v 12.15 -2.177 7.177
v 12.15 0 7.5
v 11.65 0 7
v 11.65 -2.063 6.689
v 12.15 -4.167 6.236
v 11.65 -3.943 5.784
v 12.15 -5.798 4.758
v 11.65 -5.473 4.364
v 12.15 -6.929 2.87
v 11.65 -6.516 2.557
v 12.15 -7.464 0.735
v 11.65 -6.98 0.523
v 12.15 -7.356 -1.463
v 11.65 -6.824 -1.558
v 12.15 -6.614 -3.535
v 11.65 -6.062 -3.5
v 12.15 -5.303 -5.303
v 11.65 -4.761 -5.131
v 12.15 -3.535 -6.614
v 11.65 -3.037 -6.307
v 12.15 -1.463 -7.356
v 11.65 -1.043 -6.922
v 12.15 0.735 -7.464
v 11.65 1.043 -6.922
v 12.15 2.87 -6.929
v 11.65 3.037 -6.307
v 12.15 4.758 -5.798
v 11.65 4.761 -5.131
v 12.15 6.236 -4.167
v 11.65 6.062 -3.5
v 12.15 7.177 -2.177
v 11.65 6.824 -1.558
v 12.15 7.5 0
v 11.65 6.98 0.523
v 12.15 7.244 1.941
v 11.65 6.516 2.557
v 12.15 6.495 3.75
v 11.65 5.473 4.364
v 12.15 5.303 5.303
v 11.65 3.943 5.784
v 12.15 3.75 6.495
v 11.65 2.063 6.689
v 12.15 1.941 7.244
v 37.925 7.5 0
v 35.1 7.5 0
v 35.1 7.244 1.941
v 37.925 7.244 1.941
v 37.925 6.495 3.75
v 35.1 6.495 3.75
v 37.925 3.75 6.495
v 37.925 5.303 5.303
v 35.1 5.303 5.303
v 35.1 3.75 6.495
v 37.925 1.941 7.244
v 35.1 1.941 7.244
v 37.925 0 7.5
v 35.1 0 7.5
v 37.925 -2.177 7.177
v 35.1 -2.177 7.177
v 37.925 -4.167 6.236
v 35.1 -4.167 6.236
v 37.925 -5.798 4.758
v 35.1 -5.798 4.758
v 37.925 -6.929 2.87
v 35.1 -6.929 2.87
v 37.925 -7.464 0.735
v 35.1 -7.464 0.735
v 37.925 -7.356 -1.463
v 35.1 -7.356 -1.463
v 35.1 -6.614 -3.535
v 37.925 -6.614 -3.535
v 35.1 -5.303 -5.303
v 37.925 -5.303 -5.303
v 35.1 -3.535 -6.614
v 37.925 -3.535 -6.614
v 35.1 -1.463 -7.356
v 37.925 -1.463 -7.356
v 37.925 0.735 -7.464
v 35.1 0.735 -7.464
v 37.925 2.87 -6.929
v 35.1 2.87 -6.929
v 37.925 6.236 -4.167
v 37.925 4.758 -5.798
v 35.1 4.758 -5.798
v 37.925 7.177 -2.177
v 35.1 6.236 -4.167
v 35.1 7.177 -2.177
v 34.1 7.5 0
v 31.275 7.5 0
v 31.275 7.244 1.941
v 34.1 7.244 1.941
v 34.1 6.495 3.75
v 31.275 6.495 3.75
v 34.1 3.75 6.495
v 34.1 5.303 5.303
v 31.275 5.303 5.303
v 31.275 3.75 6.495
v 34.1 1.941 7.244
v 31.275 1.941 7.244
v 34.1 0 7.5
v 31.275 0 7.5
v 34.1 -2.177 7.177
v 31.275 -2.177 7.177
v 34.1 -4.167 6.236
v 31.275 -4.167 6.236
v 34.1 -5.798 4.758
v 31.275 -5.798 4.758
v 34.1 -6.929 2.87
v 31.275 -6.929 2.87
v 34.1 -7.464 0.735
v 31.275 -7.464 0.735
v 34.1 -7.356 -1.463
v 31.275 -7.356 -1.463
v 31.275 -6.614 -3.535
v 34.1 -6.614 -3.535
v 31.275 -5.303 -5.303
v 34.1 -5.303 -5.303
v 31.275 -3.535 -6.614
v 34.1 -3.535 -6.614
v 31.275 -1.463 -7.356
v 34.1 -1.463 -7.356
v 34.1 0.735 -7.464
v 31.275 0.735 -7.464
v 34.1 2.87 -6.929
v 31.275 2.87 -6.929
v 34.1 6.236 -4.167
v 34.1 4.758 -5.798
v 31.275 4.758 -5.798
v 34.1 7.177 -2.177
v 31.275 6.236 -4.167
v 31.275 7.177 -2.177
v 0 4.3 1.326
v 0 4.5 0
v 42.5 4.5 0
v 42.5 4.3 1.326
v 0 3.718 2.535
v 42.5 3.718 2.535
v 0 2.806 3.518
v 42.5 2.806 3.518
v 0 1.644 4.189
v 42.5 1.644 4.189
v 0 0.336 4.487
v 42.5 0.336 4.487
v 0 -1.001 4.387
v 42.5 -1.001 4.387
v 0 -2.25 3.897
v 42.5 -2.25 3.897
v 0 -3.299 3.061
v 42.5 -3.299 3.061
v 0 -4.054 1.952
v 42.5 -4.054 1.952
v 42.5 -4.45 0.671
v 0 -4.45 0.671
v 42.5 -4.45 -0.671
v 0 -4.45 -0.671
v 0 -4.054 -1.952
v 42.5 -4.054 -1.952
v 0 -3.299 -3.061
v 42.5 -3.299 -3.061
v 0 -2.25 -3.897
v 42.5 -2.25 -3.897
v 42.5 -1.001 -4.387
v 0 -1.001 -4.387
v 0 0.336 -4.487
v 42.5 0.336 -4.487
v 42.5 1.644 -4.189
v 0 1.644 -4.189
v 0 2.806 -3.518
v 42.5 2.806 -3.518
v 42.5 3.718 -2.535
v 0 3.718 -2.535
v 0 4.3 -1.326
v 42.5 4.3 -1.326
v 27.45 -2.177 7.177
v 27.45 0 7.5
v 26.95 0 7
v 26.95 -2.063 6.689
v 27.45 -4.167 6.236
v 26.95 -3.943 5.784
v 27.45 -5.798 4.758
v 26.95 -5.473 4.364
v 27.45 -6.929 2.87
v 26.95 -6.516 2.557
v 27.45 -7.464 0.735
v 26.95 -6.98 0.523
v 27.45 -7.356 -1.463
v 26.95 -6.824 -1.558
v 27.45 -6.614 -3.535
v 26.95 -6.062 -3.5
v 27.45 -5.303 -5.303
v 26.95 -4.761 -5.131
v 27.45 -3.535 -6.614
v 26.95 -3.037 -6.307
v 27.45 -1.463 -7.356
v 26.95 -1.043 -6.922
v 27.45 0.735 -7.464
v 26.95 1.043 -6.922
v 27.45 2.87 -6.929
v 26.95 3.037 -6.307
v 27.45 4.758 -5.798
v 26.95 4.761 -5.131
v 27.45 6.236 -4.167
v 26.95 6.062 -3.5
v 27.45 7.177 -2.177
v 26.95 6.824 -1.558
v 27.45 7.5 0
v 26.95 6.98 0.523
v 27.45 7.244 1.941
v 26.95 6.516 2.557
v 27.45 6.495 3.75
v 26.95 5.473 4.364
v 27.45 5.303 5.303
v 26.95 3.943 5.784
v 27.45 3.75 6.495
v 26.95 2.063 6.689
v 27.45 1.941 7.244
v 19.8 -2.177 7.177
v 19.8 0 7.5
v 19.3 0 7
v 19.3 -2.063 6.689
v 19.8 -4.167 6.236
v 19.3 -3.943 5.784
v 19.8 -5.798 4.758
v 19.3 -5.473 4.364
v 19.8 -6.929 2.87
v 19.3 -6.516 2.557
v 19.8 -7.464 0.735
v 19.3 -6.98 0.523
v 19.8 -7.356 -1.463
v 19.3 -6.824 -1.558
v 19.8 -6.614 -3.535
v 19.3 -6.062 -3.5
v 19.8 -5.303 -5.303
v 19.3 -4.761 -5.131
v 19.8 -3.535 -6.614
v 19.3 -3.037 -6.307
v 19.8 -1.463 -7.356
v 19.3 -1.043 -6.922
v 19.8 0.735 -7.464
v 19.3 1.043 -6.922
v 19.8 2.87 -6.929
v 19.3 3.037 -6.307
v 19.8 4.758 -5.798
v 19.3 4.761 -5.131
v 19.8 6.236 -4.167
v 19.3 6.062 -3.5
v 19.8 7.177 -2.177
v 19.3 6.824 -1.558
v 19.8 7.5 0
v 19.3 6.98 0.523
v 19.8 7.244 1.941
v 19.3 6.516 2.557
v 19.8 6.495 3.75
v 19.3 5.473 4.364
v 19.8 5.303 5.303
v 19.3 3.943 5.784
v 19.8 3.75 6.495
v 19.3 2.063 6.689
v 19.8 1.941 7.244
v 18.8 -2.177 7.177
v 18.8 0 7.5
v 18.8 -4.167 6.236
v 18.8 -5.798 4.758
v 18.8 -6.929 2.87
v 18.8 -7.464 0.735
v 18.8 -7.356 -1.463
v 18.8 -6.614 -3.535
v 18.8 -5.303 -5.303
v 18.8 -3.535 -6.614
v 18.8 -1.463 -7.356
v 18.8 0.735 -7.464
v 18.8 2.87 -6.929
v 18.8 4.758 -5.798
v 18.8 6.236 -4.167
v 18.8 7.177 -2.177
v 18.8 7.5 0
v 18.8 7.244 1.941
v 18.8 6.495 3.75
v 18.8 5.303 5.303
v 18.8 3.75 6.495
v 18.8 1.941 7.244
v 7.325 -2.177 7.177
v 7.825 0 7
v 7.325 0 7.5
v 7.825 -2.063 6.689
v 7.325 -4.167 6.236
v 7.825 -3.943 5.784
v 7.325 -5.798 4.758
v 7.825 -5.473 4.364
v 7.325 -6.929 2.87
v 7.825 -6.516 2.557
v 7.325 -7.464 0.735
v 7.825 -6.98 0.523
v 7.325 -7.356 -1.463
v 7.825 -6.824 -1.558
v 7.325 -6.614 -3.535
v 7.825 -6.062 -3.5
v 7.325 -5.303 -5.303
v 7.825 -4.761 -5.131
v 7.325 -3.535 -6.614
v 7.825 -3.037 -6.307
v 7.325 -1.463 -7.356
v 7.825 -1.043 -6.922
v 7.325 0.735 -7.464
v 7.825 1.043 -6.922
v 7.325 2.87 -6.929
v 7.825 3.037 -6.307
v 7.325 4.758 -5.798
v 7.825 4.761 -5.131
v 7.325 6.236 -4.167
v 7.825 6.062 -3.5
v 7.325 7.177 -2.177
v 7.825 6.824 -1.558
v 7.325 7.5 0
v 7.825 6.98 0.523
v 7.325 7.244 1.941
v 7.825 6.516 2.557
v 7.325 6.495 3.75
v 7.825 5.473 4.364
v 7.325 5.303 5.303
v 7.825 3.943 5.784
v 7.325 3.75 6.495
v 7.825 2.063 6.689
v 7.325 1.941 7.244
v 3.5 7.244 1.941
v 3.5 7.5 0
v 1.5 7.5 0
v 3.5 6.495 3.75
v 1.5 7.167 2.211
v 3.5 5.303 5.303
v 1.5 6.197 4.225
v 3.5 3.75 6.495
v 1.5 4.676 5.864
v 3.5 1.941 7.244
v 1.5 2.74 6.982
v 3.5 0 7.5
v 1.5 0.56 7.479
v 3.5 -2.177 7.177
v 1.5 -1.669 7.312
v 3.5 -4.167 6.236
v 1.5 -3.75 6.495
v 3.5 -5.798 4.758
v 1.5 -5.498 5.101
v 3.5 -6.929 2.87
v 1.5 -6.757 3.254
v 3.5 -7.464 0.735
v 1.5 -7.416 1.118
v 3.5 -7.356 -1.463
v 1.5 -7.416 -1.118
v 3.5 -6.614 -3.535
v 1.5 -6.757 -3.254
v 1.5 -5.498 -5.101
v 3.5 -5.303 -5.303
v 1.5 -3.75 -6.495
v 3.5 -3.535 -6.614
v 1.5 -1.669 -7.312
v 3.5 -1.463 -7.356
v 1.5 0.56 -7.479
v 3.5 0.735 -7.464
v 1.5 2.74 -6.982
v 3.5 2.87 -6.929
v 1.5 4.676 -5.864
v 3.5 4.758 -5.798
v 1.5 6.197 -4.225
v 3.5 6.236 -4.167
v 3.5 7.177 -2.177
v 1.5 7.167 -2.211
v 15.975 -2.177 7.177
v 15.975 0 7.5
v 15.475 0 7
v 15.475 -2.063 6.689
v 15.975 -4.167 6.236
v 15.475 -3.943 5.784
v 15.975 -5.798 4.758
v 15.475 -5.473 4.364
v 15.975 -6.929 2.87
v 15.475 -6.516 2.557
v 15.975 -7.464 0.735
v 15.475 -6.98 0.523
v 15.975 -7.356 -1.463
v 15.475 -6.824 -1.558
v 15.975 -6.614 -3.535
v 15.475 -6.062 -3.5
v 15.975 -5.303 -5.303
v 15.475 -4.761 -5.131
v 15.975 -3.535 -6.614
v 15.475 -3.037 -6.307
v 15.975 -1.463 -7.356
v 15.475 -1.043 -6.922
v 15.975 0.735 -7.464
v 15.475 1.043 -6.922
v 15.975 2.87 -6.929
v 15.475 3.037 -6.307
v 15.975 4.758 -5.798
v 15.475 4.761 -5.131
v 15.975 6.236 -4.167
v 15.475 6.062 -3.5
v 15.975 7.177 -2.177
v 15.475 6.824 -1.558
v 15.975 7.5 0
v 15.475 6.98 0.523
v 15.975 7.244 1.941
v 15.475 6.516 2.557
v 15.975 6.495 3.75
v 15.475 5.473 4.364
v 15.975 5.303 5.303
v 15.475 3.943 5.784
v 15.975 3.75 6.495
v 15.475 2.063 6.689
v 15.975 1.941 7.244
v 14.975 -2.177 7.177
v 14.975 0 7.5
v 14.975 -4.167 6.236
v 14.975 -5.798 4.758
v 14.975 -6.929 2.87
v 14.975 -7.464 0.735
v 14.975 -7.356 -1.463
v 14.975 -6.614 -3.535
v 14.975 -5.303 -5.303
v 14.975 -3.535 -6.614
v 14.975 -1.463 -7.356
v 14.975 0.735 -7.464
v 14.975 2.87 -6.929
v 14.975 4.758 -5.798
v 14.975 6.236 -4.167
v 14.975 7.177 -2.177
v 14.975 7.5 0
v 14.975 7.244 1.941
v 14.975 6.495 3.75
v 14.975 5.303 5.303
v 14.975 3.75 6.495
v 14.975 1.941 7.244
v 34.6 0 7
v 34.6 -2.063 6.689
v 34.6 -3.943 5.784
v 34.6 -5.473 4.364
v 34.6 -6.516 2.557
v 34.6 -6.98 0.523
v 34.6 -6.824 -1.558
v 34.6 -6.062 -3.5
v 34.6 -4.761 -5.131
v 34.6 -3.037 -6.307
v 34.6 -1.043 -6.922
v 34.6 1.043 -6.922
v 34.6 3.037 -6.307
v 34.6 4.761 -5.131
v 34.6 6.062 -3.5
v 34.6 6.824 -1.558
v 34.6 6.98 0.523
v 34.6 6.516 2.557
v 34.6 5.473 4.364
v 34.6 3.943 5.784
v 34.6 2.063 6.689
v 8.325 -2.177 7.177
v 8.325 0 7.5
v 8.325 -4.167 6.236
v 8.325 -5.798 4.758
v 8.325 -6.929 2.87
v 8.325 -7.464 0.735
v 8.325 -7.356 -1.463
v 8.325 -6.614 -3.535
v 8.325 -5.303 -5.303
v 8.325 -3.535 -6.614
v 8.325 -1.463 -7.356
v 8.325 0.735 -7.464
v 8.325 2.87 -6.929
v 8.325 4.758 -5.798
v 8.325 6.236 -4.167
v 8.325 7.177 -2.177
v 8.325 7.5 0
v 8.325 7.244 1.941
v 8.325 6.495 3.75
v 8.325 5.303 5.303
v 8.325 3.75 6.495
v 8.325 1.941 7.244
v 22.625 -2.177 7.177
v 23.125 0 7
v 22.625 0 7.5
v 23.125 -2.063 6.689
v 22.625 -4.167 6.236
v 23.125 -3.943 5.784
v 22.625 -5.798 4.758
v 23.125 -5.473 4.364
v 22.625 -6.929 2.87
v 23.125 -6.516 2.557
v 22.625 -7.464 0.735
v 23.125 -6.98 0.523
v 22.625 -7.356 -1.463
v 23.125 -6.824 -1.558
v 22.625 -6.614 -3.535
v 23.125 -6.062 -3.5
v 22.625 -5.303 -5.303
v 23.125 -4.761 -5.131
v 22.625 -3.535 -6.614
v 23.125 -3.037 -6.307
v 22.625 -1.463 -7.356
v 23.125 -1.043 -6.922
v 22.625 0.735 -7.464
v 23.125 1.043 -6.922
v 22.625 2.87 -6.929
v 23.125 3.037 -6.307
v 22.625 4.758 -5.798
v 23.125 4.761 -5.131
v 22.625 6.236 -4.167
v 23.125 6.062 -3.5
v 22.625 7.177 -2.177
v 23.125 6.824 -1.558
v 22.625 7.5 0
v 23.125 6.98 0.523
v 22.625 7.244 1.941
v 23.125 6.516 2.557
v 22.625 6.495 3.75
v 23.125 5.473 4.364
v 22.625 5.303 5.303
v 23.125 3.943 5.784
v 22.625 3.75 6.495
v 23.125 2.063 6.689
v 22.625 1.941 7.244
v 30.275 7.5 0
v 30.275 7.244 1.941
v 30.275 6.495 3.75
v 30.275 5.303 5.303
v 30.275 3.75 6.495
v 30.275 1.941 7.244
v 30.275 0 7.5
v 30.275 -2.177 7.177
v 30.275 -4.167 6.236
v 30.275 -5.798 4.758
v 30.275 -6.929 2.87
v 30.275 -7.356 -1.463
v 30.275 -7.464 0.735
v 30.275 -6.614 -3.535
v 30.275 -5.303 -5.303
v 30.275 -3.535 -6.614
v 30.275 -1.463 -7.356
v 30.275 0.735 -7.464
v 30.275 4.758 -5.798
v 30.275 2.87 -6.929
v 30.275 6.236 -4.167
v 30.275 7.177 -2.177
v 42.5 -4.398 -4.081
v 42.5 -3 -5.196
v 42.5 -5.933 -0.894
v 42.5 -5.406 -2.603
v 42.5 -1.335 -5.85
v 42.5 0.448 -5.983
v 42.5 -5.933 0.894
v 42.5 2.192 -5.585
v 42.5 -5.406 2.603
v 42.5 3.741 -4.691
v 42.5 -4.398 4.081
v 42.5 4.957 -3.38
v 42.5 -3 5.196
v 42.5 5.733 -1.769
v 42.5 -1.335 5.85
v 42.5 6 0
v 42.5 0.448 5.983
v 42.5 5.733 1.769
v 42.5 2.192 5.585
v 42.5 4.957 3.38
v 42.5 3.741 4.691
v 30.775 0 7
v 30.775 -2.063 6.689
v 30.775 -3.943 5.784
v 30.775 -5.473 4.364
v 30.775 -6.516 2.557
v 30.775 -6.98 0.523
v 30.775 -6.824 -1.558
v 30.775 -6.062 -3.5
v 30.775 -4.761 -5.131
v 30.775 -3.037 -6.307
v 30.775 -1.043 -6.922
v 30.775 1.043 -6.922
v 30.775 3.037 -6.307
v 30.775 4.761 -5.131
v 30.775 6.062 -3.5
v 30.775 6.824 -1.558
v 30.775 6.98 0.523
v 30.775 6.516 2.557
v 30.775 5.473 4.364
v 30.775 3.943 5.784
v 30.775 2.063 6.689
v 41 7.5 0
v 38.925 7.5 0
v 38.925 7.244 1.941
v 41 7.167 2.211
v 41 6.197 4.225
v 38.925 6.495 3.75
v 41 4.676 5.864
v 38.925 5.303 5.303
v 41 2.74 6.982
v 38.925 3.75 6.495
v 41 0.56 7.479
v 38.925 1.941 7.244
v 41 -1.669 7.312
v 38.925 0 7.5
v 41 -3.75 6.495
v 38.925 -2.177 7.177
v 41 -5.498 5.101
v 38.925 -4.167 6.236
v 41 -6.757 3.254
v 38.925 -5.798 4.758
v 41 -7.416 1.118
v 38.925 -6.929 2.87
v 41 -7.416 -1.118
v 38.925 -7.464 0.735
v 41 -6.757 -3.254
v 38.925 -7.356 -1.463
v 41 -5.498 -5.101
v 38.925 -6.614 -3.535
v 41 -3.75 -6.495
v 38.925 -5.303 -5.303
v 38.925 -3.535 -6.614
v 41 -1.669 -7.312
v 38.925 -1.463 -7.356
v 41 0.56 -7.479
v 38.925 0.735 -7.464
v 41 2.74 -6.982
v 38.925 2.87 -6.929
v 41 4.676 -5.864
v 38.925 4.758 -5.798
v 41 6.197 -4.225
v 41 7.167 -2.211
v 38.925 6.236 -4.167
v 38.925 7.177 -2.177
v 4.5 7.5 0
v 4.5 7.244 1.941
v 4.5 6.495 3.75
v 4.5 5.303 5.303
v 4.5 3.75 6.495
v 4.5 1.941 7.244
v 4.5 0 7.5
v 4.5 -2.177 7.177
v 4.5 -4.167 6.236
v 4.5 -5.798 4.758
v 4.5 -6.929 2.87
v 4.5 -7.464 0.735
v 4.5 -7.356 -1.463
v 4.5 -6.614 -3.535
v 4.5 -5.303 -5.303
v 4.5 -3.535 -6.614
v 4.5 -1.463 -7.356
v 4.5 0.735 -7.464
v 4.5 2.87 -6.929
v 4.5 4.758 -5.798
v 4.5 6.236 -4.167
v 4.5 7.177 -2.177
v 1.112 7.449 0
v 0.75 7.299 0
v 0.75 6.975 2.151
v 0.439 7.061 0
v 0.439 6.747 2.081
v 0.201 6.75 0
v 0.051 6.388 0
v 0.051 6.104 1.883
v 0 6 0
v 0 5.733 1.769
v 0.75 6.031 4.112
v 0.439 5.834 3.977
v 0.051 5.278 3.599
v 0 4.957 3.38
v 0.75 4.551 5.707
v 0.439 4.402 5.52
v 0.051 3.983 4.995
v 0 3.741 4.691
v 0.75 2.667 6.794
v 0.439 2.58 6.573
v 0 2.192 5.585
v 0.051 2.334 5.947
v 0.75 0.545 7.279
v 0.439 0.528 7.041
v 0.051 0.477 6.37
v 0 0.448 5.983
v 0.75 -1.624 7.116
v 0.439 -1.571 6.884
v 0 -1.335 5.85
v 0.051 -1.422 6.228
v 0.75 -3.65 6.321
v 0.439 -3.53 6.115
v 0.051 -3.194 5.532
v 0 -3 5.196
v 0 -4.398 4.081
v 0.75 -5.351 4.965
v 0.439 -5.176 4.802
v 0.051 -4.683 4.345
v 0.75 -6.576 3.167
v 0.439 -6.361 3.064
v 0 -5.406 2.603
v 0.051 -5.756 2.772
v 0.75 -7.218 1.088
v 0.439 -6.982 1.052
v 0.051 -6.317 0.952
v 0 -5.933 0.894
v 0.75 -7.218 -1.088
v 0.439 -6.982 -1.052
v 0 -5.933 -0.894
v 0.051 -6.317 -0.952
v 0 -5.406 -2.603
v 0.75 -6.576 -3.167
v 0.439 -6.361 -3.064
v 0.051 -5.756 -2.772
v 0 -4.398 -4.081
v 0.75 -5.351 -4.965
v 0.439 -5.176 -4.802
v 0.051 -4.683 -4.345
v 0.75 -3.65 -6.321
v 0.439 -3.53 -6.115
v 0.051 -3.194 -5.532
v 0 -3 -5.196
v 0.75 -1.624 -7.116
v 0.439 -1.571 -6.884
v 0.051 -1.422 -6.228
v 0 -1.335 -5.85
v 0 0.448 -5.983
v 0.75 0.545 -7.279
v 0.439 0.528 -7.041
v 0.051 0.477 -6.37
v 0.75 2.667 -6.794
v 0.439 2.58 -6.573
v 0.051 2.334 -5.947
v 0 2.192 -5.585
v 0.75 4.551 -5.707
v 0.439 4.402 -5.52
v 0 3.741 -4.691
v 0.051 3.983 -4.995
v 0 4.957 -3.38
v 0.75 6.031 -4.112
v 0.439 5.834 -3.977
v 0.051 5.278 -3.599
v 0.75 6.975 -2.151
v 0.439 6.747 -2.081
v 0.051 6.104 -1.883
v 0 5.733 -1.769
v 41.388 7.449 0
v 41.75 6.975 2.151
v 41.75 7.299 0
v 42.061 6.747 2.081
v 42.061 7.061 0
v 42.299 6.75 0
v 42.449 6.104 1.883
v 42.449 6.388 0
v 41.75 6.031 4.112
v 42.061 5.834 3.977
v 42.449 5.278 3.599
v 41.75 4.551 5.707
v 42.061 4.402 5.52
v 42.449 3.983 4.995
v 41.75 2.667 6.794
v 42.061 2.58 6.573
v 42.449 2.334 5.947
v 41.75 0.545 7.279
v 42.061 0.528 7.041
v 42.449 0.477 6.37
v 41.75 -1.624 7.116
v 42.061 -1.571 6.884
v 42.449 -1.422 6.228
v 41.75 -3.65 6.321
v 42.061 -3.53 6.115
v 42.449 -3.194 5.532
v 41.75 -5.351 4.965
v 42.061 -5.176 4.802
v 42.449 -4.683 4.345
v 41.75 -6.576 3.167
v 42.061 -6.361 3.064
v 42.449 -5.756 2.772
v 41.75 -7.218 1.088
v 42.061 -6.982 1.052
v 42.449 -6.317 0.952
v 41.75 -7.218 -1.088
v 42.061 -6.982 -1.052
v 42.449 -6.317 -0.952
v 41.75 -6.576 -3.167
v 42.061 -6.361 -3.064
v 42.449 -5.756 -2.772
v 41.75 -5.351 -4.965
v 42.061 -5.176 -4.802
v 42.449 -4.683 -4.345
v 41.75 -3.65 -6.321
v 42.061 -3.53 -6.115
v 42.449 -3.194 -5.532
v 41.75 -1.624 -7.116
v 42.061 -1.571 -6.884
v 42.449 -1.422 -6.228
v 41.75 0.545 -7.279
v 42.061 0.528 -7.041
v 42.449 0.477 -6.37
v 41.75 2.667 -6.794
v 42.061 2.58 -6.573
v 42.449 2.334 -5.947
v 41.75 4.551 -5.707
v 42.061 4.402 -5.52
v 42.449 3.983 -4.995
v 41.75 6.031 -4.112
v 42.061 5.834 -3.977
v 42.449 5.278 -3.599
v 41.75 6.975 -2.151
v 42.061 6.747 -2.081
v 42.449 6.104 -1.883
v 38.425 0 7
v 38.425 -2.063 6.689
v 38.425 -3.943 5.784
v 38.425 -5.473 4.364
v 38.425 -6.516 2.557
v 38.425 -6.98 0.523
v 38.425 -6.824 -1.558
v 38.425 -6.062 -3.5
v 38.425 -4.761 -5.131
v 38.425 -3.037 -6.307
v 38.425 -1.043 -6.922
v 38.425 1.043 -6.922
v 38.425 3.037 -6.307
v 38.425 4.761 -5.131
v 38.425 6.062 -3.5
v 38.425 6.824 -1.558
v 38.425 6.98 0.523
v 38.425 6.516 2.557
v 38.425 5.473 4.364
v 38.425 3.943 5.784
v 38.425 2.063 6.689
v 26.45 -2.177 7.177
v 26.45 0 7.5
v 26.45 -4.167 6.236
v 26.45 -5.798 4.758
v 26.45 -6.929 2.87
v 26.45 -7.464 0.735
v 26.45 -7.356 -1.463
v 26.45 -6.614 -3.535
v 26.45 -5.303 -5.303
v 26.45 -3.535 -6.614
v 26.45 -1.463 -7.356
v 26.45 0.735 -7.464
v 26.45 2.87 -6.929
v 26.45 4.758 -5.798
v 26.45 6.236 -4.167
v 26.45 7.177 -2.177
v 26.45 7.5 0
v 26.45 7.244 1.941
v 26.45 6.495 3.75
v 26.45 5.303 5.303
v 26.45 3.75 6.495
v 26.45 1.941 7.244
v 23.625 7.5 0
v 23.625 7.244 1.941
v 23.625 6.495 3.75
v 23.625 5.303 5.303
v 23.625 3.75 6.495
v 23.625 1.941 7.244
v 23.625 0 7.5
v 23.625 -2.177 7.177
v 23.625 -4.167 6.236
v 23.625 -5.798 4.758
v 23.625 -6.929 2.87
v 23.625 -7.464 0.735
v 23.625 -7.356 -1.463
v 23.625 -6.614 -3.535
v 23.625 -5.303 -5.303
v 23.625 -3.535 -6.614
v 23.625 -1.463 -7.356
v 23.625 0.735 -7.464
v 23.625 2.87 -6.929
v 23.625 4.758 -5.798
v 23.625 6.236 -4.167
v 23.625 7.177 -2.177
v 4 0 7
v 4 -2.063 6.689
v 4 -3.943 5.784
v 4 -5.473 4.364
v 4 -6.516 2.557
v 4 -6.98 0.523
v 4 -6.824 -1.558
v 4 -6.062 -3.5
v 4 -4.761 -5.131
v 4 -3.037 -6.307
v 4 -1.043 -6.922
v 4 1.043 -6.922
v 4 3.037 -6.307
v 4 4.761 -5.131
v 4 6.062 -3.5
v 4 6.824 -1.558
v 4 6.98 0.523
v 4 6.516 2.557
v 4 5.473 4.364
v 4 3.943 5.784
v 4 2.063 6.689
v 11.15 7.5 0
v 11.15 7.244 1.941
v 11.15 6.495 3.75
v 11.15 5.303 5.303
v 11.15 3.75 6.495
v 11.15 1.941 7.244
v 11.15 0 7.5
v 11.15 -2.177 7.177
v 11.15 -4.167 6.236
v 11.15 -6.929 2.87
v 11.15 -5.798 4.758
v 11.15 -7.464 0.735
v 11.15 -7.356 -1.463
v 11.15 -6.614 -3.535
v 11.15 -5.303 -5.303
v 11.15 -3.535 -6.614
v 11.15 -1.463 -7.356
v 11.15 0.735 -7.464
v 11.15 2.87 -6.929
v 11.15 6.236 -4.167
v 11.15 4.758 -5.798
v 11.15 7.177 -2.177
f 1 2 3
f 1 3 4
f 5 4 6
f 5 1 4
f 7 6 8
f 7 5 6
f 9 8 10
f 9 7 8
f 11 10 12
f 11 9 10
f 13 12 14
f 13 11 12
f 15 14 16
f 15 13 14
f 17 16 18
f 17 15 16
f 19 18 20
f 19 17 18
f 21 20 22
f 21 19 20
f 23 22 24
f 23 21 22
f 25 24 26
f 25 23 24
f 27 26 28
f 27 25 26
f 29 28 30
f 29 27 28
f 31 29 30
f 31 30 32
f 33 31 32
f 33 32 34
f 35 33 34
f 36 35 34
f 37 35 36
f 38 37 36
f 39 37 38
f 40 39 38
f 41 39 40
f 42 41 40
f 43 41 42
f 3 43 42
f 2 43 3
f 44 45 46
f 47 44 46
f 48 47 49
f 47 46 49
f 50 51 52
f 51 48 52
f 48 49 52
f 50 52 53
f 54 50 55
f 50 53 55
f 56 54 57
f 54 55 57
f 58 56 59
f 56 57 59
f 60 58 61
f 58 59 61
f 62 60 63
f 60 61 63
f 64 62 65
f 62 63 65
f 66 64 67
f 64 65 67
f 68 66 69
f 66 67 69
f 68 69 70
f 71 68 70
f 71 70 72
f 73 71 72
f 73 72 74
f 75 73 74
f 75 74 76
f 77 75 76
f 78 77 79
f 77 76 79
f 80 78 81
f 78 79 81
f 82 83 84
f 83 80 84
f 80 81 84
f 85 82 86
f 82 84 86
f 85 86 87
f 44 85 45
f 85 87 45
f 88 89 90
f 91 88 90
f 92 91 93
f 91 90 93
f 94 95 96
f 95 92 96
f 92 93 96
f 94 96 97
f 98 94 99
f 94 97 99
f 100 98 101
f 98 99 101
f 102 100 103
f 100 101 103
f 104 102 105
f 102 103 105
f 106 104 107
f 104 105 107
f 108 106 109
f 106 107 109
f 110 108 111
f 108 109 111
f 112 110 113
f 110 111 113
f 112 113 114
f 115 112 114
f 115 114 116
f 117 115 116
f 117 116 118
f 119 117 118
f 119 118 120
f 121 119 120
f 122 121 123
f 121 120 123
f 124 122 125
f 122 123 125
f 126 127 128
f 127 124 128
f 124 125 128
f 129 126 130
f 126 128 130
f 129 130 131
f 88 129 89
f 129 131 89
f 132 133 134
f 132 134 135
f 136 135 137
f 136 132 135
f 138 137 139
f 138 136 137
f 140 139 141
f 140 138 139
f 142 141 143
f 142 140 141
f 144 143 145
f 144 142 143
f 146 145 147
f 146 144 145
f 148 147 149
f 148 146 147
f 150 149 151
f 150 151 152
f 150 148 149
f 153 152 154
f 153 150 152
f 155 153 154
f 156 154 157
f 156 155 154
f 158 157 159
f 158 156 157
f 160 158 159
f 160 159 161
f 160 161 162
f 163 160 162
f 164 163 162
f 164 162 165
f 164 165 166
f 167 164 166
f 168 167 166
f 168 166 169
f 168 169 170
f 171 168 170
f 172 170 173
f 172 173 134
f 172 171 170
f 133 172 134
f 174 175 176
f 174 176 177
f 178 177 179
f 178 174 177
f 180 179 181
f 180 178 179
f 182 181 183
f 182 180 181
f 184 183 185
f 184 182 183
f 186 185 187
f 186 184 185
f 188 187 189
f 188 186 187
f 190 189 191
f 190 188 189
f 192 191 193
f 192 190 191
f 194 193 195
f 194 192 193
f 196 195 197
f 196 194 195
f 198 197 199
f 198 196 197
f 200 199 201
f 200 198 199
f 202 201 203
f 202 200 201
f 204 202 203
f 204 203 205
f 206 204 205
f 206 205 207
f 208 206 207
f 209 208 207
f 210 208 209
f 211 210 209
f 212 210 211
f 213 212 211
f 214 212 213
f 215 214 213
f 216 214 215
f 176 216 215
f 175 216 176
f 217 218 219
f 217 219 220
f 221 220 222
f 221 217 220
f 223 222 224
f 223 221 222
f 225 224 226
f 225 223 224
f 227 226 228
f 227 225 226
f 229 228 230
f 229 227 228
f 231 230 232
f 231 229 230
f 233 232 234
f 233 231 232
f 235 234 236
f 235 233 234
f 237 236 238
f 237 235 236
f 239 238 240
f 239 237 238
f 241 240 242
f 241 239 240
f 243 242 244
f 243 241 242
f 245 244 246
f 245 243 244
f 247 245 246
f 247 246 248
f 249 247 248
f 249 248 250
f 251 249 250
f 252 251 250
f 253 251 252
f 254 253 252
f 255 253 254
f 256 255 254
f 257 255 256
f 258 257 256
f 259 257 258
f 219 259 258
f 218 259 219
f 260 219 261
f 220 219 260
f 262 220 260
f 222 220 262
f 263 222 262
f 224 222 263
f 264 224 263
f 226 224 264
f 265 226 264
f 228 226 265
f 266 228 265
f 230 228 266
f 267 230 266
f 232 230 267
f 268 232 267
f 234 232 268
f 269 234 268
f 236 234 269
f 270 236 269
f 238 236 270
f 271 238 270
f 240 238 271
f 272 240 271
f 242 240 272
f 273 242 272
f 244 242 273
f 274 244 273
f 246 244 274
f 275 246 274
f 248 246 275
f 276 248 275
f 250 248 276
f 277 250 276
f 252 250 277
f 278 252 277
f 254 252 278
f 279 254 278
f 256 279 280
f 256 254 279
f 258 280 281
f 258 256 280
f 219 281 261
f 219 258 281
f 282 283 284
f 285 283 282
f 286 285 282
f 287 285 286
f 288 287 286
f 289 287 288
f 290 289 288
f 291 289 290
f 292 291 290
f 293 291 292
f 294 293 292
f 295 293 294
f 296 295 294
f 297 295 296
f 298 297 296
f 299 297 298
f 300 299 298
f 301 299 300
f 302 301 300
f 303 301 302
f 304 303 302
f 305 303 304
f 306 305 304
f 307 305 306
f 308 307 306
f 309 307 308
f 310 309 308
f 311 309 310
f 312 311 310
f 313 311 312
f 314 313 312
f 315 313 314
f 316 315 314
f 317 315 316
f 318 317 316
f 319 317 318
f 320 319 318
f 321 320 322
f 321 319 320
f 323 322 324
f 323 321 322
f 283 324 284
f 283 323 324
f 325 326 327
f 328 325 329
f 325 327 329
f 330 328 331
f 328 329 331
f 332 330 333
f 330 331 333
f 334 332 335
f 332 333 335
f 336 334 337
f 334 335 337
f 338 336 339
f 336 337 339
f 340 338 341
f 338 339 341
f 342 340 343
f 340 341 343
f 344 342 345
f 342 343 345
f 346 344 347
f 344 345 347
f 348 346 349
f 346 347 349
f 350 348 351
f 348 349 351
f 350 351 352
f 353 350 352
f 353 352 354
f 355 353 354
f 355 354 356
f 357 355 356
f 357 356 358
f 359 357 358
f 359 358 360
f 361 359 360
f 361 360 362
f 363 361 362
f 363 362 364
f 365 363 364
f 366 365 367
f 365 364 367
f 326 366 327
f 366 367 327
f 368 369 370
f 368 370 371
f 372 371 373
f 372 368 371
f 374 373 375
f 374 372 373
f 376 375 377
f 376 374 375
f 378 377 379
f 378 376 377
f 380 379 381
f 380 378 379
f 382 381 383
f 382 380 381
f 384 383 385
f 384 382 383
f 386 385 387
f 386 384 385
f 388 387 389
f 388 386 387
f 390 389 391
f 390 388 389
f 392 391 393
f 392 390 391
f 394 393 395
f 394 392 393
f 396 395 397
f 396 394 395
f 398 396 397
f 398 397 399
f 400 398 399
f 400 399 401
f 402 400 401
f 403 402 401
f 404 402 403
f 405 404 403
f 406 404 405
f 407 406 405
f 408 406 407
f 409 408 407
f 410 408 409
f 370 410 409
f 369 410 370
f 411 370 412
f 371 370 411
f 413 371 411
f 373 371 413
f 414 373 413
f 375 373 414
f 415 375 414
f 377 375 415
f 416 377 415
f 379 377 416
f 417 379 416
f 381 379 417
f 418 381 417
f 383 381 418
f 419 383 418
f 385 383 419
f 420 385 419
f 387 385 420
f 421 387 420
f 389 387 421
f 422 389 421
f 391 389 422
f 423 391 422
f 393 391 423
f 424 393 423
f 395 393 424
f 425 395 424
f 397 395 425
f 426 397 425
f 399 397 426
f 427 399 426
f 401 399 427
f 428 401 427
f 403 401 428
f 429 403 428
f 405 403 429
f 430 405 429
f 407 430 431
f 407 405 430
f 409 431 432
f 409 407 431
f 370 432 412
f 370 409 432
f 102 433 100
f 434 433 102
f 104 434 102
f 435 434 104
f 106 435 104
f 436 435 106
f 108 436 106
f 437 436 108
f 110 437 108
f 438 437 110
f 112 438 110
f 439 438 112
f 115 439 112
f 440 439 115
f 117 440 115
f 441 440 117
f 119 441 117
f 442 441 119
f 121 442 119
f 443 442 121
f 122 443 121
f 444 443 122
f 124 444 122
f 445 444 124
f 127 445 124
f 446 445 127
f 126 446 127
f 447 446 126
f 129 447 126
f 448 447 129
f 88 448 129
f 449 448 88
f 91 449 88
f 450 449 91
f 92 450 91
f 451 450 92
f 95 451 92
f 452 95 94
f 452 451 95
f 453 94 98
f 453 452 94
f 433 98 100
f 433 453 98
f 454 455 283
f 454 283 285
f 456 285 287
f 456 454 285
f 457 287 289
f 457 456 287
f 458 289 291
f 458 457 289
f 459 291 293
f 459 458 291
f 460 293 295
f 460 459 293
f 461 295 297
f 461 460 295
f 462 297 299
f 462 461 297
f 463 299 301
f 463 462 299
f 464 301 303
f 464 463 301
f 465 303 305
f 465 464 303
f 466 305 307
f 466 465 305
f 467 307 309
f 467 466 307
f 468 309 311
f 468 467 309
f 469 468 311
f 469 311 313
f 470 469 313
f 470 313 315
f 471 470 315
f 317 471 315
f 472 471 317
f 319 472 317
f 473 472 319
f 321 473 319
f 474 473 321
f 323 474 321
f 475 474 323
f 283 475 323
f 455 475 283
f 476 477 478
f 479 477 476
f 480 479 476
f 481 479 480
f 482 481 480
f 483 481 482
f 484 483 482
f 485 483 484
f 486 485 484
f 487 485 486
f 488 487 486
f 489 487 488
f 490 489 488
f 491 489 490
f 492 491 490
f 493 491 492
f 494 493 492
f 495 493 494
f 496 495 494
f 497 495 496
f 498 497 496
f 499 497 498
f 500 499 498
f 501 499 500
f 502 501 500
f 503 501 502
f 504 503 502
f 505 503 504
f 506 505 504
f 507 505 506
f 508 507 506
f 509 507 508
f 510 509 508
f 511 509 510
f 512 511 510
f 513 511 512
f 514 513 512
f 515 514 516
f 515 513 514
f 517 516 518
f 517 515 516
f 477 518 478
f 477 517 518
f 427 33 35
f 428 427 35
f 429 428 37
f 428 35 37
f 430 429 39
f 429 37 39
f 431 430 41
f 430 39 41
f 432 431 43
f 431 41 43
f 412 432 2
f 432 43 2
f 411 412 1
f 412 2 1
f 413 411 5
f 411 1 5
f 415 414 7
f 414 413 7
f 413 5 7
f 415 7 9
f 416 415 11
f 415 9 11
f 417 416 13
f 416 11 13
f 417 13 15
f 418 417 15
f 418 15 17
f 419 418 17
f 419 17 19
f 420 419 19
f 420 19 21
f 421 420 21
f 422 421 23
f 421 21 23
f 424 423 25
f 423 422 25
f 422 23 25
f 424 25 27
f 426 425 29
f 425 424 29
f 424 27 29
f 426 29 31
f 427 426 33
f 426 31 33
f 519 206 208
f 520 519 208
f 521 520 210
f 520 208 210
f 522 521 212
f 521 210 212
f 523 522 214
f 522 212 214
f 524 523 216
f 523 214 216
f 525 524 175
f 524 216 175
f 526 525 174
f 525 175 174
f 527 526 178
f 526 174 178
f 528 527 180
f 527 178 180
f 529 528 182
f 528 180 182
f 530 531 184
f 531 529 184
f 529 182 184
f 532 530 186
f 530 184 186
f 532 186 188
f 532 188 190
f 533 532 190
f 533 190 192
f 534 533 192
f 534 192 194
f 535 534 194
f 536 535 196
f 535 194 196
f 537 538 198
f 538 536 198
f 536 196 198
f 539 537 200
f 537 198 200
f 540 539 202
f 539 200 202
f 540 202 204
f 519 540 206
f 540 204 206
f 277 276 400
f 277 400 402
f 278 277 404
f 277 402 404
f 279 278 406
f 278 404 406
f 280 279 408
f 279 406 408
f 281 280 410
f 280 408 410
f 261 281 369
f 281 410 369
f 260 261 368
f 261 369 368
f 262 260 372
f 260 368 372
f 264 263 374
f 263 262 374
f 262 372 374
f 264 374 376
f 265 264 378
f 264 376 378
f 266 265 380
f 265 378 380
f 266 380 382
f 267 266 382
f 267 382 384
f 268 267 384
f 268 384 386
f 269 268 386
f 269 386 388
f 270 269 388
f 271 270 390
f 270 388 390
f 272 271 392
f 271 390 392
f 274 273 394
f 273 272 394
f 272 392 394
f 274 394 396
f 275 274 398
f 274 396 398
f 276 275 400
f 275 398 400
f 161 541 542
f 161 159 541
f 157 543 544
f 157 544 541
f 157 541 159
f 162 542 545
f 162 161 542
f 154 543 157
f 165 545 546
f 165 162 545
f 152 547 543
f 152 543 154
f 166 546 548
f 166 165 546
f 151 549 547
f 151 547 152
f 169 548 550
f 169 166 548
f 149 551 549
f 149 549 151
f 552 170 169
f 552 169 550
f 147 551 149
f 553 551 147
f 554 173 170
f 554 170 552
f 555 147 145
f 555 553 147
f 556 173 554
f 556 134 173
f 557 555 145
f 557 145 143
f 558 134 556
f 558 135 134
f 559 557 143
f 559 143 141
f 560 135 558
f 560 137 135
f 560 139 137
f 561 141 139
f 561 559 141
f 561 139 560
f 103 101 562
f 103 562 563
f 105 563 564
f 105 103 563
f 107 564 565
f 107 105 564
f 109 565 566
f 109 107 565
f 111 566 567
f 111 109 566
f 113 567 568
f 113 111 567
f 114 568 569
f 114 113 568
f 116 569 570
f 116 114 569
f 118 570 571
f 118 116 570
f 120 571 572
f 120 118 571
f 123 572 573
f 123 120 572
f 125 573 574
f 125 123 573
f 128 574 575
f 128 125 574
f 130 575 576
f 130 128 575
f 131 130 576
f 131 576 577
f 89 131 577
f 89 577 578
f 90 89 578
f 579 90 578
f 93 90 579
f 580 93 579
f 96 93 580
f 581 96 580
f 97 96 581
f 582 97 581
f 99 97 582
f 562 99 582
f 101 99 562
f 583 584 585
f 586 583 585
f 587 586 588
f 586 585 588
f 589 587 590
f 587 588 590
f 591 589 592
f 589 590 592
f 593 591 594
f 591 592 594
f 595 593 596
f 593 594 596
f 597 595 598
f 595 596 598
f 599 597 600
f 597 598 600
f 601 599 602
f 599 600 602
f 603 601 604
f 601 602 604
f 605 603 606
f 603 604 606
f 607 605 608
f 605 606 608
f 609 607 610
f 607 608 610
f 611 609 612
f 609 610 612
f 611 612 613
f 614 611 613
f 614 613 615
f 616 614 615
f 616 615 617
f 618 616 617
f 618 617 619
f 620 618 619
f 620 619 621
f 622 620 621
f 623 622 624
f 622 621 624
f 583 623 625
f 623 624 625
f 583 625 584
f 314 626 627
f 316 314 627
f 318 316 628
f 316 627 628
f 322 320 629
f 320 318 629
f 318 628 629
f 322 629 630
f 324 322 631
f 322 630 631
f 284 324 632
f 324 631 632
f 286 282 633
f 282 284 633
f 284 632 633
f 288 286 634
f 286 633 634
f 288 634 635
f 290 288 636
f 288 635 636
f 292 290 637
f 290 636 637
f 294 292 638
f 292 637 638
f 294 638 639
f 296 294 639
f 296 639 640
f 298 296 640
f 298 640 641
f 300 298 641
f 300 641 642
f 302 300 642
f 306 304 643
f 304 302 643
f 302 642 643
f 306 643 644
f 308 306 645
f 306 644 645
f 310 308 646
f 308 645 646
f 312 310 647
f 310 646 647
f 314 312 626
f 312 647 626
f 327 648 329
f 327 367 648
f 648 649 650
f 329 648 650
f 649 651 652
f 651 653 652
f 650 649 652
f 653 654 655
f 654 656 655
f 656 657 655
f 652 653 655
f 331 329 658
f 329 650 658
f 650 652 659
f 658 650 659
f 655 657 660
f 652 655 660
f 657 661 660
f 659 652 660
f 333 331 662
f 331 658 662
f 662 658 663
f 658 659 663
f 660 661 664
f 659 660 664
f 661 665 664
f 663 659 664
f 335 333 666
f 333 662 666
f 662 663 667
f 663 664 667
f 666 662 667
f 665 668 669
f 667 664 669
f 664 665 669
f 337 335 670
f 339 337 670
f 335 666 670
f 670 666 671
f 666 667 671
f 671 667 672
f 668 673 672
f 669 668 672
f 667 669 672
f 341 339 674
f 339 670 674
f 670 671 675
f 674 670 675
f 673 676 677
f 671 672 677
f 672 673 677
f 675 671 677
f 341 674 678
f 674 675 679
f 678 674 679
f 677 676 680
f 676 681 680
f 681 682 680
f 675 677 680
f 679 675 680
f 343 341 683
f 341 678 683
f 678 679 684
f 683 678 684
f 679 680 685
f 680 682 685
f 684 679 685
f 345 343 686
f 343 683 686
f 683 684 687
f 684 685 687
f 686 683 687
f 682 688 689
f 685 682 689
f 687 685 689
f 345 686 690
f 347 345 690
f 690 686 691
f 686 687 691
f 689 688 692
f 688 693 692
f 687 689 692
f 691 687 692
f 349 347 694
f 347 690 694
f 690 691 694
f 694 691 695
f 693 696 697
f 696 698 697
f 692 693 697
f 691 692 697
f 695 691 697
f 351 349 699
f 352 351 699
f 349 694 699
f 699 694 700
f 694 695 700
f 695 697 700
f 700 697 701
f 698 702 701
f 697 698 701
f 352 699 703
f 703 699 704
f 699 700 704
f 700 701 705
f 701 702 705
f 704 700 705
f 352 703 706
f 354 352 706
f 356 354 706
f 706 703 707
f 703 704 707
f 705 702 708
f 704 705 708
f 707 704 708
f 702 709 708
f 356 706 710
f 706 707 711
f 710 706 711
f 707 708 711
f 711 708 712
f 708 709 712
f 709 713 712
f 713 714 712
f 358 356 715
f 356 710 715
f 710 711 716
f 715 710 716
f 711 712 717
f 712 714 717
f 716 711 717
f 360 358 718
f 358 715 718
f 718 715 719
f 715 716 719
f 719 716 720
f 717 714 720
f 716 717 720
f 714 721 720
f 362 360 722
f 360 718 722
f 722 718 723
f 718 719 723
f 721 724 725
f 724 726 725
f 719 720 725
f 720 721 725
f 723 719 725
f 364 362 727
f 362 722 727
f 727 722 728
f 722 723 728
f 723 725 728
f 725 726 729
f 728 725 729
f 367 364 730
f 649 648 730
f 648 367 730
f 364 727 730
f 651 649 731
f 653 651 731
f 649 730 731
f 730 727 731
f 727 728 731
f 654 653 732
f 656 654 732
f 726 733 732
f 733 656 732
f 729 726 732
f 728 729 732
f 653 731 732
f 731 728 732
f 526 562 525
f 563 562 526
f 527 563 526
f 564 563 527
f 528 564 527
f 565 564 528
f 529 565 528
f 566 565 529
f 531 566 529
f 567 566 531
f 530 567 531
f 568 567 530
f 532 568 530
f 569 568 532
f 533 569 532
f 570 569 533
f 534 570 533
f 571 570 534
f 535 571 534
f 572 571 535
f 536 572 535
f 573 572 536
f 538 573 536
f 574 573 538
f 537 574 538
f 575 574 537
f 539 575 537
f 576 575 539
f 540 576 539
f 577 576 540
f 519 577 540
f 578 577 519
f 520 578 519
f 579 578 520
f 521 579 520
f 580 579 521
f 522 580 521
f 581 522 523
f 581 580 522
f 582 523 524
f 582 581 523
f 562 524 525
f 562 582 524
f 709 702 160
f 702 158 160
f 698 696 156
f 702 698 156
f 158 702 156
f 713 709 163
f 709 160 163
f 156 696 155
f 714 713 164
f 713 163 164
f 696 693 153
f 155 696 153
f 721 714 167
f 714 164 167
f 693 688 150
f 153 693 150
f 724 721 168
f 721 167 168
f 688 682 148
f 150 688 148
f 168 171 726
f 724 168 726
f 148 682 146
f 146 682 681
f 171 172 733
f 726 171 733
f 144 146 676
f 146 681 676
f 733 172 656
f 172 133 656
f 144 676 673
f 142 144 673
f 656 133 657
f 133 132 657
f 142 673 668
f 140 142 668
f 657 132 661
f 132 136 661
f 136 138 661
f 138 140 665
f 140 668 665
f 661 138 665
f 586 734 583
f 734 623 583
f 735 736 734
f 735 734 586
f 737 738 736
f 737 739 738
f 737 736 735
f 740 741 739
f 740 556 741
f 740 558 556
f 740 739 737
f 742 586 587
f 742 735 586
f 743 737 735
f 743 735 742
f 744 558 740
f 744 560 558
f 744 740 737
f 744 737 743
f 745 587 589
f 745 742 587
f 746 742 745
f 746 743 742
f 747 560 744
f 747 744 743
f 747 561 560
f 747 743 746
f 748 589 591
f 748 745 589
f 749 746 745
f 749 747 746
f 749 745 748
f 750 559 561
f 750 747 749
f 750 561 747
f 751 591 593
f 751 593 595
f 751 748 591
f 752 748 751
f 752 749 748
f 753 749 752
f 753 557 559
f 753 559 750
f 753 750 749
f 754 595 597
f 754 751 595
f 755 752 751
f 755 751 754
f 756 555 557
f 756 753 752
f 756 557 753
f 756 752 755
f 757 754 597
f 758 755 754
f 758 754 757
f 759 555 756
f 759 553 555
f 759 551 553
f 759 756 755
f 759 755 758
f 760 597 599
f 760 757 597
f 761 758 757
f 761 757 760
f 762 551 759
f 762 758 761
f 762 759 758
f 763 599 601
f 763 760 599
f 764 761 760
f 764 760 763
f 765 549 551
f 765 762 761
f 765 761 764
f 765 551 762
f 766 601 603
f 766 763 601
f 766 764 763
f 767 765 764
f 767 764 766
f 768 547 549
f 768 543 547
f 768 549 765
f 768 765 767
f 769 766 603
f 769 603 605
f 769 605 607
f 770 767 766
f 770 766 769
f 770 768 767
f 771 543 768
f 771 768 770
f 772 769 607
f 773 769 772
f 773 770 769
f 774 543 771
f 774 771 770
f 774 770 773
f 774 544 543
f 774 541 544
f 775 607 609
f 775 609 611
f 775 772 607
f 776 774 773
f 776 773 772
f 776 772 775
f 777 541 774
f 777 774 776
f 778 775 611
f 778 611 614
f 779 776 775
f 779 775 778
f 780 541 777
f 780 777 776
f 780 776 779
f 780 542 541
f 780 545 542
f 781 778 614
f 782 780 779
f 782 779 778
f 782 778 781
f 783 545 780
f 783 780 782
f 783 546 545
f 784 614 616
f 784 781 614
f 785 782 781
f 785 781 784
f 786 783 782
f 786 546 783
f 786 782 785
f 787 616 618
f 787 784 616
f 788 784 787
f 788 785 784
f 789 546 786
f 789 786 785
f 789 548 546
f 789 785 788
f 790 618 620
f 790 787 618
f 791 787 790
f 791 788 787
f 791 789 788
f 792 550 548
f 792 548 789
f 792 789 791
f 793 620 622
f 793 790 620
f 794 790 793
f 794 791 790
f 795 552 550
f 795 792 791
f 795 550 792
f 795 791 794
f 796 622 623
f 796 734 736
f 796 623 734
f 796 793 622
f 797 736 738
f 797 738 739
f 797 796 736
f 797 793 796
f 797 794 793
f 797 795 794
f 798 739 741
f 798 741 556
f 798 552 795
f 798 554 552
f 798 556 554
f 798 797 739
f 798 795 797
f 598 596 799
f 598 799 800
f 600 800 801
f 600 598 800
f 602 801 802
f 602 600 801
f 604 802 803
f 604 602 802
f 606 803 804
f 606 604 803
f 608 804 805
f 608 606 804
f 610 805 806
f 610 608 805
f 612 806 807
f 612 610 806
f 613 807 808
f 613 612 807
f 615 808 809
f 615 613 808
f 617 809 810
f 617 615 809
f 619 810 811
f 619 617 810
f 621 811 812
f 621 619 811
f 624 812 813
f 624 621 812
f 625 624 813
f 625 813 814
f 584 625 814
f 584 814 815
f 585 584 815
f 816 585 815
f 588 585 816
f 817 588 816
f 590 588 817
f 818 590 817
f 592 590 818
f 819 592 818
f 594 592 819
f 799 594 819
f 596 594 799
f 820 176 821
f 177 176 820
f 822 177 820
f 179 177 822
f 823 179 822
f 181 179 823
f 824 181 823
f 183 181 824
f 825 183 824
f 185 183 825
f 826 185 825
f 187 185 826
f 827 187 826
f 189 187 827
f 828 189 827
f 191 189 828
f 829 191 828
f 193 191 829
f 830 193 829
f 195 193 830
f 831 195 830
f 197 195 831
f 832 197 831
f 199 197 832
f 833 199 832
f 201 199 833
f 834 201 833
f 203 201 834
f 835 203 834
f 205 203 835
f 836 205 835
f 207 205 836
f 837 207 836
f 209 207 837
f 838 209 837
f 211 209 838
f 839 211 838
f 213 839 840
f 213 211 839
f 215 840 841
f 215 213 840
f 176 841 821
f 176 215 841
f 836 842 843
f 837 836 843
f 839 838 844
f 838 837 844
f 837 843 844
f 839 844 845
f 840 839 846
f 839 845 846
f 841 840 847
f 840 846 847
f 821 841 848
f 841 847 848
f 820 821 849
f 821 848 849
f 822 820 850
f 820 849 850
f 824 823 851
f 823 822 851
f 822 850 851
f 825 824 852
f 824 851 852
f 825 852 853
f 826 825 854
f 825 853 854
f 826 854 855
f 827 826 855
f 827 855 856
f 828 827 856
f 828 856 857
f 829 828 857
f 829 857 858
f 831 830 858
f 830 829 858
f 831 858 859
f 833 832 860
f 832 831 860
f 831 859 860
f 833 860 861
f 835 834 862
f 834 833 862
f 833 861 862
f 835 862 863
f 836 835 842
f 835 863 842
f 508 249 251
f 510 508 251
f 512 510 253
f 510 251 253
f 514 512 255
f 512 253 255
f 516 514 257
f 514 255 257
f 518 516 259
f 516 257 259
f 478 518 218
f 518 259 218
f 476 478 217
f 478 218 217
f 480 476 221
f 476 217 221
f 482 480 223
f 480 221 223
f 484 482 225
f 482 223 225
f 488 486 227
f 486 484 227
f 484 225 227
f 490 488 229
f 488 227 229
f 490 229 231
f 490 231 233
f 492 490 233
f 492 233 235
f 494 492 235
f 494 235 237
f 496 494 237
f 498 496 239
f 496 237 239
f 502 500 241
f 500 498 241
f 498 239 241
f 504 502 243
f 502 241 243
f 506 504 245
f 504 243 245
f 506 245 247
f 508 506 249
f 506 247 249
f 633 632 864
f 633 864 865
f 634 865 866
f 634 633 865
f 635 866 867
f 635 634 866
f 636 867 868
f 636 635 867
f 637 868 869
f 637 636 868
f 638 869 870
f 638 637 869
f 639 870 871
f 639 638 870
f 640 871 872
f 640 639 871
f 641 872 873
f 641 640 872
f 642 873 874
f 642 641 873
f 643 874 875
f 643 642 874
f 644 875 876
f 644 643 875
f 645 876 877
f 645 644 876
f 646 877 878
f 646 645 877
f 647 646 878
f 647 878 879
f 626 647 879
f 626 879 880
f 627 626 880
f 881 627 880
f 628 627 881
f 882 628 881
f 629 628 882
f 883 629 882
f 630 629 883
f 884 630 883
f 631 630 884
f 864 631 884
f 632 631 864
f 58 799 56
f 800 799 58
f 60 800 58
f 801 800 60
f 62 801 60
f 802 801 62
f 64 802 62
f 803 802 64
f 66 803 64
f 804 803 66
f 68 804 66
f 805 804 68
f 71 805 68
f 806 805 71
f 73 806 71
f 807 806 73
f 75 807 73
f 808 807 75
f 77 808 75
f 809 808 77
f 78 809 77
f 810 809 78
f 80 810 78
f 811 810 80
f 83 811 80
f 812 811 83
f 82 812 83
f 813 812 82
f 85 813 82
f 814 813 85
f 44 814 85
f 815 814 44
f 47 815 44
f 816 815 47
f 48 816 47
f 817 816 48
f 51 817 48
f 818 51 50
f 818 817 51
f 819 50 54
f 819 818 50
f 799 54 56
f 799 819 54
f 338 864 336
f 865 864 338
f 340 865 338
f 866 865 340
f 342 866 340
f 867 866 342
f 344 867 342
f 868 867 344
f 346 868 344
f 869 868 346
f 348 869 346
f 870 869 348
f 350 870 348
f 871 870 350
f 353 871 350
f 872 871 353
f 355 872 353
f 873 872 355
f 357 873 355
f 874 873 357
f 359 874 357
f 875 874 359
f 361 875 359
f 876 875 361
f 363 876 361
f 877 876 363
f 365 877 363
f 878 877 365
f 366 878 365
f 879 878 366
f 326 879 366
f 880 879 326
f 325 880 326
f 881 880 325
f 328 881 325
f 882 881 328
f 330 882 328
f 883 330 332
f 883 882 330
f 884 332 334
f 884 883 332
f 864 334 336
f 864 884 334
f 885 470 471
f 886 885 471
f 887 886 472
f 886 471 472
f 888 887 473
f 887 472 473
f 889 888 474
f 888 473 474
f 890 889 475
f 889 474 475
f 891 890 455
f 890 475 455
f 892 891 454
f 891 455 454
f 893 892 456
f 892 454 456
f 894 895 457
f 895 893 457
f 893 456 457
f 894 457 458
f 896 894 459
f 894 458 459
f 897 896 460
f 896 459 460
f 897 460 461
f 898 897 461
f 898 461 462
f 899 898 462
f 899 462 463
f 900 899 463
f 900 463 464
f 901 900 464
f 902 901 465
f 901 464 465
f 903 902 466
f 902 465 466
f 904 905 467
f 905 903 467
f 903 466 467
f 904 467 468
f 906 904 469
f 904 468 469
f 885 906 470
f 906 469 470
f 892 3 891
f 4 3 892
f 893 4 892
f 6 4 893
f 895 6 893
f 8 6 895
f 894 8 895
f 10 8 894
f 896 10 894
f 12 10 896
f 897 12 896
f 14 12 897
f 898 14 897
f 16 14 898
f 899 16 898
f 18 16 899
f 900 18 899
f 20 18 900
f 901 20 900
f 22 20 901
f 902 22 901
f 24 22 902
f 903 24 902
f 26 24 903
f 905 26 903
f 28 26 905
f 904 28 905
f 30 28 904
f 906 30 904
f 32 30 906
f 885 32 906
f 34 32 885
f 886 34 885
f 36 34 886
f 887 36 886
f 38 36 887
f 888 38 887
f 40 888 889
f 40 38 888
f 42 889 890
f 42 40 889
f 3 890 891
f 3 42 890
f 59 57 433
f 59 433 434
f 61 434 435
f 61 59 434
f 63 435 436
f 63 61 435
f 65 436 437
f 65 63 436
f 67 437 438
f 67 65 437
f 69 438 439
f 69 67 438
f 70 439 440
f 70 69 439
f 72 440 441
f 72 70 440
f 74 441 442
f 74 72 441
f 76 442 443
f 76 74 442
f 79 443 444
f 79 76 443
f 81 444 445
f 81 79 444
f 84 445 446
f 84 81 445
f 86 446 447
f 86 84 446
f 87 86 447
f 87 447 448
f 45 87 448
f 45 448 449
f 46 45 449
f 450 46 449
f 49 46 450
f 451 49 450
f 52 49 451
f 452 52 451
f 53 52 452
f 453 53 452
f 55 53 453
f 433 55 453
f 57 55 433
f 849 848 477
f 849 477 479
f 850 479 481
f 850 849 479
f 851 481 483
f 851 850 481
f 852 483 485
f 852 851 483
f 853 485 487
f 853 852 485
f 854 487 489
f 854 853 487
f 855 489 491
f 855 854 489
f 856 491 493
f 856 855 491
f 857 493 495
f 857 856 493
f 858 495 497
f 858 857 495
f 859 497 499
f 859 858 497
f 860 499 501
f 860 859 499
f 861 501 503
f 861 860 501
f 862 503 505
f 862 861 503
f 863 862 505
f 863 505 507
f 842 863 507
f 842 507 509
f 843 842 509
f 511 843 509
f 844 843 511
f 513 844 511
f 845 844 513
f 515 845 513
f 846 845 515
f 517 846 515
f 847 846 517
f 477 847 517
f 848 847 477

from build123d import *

# Parameters (mm, degrees)
F0_R     = 7.5
F0_R_2   = 4.5
F1_DEPTH = 42.5
F2_R     = 1.5


with BuildPart() as f1:
    # F0 (on Right) → F1 (new body)
    with BuildSketch(Plane.YZ):
        Circle(F0_R)
        Circle(F0_R_2, mode=Mode.SUBTRACT)
    extrude(amount=F1_DEPTH)

    # F2
    f2_edges = [f1.edges().sort_by_distance(p)[0] for p in [
        (42.5, -7.5, 0),
        (0, -7.5, 0),
    ]]
    fillet(f2_edges, radius=F2_R)

    # F6 (on Front) → F7 (revolve, cut)
    with BuildSketch(Plane.XZ):
        Polygon((5.414214, 8.414214), (2.585786, 8.414214), (4, 7), align=None)
        Polygon((6.410786, 8.414214), (7.825, 7), (9.239214, 8.414214), align=None)
        Polygon((10.235786, 8.414214), (11.65, 7), (13.064214, 8.414214), align=None)
        Polygon((14.060786, 8.414214), (15.475, 7), (16.889214, 8.414214), align=None)
        Polygon((17.885786, 8.414214), (19.3, 7), (20.714214, 8.414214), align=None)
        Polygon((21.710786, 8.414214), (23.125, 7), (24.539214, 8.414214), align=None)
        Polygon((25.535786, 8.414214), (26.95, 7), (28.364214, 8.414214), align=None)
        Polygon((29.360786, 8.414214), (30.775, 7), (32.189214, 8.414214), align=None)
        Polygon((33.185786, 8.414214), (34.6, 7), (36.014214, 8.414214), align=None)
        Polygon((37.010786, 8.414214), (38.425, 7), (39.839214, 8.414214), align=None)
    revolve(axis=Axis((21.25, 0, 0), (1, 0, 0)), mode=Mode.SUBTRACT)


solid = f1.part
